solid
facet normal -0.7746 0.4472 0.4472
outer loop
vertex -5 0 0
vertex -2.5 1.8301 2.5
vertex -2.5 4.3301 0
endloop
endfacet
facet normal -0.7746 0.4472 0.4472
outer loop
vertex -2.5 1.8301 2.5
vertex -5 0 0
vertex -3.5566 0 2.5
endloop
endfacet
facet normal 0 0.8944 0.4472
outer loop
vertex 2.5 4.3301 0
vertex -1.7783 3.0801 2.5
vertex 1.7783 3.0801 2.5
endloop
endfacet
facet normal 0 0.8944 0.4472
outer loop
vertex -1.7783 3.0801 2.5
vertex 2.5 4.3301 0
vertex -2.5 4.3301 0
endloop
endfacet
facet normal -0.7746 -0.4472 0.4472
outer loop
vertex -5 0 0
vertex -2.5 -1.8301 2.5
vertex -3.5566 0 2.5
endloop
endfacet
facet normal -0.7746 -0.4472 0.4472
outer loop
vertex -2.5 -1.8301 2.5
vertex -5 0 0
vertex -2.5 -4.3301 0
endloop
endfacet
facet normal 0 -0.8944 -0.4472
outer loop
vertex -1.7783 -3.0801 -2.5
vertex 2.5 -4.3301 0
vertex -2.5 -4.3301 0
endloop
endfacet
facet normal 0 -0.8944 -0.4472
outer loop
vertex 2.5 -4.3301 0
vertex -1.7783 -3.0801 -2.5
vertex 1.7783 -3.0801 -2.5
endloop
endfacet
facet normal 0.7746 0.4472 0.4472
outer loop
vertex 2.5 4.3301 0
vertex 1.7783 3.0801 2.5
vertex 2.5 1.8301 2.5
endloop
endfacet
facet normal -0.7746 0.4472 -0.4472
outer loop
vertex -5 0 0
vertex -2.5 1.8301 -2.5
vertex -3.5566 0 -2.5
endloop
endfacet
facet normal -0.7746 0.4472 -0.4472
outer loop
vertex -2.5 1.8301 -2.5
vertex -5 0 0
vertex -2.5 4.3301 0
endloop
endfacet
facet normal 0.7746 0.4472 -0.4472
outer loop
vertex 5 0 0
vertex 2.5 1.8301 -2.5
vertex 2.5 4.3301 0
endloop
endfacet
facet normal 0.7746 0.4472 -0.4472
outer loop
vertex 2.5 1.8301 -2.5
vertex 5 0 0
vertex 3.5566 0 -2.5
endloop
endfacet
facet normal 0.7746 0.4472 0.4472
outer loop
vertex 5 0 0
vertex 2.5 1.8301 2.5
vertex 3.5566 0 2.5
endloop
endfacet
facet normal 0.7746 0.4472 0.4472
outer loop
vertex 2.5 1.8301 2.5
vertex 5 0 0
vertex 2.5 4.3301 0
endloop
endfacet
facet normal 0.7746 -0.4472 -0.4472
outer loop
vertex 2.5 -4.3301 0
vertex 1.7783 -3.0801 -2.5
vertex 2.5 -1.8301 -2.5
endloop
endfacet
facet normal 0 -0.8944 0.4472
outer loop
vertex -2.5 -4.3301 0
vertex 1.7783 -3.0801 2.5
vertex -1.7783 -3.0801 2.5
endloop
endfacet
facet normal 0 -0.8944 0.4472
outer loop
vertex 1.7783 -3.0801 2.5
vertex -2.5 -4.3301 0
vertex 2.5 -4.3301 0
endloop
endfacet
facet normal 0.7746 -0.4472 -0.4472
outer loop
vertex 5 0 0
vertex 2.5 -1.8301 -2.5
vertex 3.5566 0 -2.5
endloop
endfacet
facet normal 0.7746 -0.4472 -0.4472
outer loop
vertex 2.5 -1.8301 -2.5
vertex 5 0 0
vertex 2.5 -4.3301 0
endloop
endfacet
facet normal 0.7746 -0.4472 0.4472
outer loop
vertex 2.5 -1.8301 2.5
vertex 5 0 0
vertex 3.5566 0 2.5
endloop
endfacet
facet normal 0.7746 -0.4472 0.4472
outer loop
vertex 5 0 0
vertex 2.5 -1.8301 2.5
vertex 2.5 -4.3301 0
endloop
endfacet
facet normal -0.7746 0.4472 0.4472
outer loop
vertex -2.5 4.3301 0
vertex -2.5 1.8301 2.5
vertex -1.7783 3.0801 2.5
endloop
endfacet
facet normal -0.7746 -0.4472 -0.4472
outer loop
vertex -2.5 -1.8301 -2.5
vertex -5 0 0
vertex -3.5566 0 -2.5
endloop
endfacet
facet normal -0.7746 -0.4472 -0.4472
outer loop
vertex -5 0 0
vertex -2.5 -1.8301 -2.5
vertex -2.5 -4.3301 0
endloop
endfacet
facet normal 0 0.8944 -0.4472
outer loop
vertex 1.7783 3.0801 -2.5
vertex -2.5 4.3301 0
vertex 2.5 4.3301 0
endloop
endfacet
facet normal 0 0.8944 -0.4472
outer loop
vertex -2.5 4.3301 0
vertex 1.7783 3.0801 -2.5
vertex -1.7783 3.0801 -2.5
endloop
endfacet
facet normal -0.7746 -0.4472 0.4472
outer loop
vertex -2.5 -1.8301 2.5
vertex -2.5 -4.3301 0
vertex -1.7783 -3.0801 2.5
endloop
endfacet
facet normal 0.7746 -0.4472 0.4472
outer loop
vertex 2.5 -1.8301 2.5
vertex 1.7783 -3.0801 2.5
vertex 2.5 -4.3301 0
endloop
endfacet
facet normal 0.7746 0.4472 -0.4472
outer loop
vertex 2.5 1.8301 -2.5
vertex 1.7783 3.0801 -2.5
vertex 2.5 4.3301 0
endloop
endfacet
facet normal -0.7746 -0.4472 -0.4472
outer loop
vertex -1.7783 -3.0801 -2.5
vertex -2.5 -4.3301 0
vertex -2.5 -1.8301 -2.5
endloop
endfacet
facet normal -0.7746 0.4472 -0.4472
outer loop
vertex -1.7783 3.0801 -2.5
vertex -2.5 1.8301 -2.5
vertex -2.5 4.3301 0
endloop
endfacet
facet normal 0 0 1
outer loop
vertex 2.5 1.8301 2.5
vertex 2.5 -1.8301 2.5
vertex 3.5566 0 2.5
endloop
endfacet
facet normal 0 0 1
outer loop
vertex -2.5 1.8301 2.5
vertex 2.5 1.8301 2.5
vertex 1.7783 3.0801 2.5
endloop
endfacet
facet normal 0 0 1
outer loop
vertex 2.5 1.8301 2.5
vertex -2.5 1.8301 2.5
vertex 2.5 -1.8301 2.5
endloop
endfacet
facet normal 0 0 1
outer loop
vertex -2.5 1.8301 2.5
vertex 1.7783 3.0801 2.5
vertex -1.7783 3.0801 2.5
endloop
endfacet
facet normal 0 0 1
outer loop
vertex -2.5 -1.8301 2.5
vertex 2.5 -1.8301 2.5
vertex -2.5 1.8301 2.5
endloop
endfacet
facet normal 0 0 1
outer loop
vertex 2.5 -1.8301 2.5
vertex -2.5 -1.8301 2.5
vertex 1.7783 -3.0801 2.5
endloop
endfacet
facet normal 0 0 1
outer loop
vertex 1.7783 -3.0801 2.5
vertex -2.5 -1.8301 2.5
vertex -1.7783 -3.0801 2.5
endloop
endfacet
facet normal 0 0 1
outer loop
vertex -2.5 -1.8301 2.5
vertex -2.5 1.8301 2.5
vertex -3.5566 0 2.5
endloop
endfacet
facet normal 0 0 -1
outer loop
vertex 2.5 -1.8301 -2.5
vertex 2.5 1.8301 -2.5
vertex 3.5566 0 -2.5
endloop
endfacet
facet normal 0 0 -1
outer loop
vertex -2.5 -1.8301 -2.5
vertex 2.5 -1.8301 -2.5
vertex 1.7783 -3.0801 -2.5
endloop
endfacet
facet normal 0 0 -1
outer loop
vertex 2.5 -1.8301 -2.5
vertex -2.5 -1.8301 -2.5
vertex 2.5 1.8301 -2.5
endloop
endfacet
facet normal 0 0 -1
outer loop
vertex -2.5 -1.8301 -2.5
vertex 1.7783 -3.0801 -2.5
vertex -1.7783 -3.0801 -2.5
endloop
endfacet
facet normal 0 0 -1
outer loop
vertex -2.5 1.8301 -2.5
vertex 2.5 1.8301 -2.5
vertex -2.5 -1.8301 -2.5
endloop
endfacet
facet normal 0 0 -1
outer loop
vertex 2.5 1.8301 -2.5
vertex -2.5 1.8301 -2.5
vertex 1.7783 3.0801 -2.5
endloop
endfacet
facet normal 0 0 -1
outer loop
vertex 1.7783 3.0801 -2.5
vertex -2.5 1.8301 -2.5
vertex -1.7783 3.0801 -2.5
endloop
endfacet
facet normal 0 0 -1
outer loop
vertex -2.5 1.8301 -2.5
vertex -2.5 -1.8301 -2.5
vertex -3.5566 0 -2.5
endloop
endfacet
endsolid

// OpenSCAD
intersection() {
	sphere(r=5, center=true, $fn=6);
	cube([20,20,5], center=true);
}
